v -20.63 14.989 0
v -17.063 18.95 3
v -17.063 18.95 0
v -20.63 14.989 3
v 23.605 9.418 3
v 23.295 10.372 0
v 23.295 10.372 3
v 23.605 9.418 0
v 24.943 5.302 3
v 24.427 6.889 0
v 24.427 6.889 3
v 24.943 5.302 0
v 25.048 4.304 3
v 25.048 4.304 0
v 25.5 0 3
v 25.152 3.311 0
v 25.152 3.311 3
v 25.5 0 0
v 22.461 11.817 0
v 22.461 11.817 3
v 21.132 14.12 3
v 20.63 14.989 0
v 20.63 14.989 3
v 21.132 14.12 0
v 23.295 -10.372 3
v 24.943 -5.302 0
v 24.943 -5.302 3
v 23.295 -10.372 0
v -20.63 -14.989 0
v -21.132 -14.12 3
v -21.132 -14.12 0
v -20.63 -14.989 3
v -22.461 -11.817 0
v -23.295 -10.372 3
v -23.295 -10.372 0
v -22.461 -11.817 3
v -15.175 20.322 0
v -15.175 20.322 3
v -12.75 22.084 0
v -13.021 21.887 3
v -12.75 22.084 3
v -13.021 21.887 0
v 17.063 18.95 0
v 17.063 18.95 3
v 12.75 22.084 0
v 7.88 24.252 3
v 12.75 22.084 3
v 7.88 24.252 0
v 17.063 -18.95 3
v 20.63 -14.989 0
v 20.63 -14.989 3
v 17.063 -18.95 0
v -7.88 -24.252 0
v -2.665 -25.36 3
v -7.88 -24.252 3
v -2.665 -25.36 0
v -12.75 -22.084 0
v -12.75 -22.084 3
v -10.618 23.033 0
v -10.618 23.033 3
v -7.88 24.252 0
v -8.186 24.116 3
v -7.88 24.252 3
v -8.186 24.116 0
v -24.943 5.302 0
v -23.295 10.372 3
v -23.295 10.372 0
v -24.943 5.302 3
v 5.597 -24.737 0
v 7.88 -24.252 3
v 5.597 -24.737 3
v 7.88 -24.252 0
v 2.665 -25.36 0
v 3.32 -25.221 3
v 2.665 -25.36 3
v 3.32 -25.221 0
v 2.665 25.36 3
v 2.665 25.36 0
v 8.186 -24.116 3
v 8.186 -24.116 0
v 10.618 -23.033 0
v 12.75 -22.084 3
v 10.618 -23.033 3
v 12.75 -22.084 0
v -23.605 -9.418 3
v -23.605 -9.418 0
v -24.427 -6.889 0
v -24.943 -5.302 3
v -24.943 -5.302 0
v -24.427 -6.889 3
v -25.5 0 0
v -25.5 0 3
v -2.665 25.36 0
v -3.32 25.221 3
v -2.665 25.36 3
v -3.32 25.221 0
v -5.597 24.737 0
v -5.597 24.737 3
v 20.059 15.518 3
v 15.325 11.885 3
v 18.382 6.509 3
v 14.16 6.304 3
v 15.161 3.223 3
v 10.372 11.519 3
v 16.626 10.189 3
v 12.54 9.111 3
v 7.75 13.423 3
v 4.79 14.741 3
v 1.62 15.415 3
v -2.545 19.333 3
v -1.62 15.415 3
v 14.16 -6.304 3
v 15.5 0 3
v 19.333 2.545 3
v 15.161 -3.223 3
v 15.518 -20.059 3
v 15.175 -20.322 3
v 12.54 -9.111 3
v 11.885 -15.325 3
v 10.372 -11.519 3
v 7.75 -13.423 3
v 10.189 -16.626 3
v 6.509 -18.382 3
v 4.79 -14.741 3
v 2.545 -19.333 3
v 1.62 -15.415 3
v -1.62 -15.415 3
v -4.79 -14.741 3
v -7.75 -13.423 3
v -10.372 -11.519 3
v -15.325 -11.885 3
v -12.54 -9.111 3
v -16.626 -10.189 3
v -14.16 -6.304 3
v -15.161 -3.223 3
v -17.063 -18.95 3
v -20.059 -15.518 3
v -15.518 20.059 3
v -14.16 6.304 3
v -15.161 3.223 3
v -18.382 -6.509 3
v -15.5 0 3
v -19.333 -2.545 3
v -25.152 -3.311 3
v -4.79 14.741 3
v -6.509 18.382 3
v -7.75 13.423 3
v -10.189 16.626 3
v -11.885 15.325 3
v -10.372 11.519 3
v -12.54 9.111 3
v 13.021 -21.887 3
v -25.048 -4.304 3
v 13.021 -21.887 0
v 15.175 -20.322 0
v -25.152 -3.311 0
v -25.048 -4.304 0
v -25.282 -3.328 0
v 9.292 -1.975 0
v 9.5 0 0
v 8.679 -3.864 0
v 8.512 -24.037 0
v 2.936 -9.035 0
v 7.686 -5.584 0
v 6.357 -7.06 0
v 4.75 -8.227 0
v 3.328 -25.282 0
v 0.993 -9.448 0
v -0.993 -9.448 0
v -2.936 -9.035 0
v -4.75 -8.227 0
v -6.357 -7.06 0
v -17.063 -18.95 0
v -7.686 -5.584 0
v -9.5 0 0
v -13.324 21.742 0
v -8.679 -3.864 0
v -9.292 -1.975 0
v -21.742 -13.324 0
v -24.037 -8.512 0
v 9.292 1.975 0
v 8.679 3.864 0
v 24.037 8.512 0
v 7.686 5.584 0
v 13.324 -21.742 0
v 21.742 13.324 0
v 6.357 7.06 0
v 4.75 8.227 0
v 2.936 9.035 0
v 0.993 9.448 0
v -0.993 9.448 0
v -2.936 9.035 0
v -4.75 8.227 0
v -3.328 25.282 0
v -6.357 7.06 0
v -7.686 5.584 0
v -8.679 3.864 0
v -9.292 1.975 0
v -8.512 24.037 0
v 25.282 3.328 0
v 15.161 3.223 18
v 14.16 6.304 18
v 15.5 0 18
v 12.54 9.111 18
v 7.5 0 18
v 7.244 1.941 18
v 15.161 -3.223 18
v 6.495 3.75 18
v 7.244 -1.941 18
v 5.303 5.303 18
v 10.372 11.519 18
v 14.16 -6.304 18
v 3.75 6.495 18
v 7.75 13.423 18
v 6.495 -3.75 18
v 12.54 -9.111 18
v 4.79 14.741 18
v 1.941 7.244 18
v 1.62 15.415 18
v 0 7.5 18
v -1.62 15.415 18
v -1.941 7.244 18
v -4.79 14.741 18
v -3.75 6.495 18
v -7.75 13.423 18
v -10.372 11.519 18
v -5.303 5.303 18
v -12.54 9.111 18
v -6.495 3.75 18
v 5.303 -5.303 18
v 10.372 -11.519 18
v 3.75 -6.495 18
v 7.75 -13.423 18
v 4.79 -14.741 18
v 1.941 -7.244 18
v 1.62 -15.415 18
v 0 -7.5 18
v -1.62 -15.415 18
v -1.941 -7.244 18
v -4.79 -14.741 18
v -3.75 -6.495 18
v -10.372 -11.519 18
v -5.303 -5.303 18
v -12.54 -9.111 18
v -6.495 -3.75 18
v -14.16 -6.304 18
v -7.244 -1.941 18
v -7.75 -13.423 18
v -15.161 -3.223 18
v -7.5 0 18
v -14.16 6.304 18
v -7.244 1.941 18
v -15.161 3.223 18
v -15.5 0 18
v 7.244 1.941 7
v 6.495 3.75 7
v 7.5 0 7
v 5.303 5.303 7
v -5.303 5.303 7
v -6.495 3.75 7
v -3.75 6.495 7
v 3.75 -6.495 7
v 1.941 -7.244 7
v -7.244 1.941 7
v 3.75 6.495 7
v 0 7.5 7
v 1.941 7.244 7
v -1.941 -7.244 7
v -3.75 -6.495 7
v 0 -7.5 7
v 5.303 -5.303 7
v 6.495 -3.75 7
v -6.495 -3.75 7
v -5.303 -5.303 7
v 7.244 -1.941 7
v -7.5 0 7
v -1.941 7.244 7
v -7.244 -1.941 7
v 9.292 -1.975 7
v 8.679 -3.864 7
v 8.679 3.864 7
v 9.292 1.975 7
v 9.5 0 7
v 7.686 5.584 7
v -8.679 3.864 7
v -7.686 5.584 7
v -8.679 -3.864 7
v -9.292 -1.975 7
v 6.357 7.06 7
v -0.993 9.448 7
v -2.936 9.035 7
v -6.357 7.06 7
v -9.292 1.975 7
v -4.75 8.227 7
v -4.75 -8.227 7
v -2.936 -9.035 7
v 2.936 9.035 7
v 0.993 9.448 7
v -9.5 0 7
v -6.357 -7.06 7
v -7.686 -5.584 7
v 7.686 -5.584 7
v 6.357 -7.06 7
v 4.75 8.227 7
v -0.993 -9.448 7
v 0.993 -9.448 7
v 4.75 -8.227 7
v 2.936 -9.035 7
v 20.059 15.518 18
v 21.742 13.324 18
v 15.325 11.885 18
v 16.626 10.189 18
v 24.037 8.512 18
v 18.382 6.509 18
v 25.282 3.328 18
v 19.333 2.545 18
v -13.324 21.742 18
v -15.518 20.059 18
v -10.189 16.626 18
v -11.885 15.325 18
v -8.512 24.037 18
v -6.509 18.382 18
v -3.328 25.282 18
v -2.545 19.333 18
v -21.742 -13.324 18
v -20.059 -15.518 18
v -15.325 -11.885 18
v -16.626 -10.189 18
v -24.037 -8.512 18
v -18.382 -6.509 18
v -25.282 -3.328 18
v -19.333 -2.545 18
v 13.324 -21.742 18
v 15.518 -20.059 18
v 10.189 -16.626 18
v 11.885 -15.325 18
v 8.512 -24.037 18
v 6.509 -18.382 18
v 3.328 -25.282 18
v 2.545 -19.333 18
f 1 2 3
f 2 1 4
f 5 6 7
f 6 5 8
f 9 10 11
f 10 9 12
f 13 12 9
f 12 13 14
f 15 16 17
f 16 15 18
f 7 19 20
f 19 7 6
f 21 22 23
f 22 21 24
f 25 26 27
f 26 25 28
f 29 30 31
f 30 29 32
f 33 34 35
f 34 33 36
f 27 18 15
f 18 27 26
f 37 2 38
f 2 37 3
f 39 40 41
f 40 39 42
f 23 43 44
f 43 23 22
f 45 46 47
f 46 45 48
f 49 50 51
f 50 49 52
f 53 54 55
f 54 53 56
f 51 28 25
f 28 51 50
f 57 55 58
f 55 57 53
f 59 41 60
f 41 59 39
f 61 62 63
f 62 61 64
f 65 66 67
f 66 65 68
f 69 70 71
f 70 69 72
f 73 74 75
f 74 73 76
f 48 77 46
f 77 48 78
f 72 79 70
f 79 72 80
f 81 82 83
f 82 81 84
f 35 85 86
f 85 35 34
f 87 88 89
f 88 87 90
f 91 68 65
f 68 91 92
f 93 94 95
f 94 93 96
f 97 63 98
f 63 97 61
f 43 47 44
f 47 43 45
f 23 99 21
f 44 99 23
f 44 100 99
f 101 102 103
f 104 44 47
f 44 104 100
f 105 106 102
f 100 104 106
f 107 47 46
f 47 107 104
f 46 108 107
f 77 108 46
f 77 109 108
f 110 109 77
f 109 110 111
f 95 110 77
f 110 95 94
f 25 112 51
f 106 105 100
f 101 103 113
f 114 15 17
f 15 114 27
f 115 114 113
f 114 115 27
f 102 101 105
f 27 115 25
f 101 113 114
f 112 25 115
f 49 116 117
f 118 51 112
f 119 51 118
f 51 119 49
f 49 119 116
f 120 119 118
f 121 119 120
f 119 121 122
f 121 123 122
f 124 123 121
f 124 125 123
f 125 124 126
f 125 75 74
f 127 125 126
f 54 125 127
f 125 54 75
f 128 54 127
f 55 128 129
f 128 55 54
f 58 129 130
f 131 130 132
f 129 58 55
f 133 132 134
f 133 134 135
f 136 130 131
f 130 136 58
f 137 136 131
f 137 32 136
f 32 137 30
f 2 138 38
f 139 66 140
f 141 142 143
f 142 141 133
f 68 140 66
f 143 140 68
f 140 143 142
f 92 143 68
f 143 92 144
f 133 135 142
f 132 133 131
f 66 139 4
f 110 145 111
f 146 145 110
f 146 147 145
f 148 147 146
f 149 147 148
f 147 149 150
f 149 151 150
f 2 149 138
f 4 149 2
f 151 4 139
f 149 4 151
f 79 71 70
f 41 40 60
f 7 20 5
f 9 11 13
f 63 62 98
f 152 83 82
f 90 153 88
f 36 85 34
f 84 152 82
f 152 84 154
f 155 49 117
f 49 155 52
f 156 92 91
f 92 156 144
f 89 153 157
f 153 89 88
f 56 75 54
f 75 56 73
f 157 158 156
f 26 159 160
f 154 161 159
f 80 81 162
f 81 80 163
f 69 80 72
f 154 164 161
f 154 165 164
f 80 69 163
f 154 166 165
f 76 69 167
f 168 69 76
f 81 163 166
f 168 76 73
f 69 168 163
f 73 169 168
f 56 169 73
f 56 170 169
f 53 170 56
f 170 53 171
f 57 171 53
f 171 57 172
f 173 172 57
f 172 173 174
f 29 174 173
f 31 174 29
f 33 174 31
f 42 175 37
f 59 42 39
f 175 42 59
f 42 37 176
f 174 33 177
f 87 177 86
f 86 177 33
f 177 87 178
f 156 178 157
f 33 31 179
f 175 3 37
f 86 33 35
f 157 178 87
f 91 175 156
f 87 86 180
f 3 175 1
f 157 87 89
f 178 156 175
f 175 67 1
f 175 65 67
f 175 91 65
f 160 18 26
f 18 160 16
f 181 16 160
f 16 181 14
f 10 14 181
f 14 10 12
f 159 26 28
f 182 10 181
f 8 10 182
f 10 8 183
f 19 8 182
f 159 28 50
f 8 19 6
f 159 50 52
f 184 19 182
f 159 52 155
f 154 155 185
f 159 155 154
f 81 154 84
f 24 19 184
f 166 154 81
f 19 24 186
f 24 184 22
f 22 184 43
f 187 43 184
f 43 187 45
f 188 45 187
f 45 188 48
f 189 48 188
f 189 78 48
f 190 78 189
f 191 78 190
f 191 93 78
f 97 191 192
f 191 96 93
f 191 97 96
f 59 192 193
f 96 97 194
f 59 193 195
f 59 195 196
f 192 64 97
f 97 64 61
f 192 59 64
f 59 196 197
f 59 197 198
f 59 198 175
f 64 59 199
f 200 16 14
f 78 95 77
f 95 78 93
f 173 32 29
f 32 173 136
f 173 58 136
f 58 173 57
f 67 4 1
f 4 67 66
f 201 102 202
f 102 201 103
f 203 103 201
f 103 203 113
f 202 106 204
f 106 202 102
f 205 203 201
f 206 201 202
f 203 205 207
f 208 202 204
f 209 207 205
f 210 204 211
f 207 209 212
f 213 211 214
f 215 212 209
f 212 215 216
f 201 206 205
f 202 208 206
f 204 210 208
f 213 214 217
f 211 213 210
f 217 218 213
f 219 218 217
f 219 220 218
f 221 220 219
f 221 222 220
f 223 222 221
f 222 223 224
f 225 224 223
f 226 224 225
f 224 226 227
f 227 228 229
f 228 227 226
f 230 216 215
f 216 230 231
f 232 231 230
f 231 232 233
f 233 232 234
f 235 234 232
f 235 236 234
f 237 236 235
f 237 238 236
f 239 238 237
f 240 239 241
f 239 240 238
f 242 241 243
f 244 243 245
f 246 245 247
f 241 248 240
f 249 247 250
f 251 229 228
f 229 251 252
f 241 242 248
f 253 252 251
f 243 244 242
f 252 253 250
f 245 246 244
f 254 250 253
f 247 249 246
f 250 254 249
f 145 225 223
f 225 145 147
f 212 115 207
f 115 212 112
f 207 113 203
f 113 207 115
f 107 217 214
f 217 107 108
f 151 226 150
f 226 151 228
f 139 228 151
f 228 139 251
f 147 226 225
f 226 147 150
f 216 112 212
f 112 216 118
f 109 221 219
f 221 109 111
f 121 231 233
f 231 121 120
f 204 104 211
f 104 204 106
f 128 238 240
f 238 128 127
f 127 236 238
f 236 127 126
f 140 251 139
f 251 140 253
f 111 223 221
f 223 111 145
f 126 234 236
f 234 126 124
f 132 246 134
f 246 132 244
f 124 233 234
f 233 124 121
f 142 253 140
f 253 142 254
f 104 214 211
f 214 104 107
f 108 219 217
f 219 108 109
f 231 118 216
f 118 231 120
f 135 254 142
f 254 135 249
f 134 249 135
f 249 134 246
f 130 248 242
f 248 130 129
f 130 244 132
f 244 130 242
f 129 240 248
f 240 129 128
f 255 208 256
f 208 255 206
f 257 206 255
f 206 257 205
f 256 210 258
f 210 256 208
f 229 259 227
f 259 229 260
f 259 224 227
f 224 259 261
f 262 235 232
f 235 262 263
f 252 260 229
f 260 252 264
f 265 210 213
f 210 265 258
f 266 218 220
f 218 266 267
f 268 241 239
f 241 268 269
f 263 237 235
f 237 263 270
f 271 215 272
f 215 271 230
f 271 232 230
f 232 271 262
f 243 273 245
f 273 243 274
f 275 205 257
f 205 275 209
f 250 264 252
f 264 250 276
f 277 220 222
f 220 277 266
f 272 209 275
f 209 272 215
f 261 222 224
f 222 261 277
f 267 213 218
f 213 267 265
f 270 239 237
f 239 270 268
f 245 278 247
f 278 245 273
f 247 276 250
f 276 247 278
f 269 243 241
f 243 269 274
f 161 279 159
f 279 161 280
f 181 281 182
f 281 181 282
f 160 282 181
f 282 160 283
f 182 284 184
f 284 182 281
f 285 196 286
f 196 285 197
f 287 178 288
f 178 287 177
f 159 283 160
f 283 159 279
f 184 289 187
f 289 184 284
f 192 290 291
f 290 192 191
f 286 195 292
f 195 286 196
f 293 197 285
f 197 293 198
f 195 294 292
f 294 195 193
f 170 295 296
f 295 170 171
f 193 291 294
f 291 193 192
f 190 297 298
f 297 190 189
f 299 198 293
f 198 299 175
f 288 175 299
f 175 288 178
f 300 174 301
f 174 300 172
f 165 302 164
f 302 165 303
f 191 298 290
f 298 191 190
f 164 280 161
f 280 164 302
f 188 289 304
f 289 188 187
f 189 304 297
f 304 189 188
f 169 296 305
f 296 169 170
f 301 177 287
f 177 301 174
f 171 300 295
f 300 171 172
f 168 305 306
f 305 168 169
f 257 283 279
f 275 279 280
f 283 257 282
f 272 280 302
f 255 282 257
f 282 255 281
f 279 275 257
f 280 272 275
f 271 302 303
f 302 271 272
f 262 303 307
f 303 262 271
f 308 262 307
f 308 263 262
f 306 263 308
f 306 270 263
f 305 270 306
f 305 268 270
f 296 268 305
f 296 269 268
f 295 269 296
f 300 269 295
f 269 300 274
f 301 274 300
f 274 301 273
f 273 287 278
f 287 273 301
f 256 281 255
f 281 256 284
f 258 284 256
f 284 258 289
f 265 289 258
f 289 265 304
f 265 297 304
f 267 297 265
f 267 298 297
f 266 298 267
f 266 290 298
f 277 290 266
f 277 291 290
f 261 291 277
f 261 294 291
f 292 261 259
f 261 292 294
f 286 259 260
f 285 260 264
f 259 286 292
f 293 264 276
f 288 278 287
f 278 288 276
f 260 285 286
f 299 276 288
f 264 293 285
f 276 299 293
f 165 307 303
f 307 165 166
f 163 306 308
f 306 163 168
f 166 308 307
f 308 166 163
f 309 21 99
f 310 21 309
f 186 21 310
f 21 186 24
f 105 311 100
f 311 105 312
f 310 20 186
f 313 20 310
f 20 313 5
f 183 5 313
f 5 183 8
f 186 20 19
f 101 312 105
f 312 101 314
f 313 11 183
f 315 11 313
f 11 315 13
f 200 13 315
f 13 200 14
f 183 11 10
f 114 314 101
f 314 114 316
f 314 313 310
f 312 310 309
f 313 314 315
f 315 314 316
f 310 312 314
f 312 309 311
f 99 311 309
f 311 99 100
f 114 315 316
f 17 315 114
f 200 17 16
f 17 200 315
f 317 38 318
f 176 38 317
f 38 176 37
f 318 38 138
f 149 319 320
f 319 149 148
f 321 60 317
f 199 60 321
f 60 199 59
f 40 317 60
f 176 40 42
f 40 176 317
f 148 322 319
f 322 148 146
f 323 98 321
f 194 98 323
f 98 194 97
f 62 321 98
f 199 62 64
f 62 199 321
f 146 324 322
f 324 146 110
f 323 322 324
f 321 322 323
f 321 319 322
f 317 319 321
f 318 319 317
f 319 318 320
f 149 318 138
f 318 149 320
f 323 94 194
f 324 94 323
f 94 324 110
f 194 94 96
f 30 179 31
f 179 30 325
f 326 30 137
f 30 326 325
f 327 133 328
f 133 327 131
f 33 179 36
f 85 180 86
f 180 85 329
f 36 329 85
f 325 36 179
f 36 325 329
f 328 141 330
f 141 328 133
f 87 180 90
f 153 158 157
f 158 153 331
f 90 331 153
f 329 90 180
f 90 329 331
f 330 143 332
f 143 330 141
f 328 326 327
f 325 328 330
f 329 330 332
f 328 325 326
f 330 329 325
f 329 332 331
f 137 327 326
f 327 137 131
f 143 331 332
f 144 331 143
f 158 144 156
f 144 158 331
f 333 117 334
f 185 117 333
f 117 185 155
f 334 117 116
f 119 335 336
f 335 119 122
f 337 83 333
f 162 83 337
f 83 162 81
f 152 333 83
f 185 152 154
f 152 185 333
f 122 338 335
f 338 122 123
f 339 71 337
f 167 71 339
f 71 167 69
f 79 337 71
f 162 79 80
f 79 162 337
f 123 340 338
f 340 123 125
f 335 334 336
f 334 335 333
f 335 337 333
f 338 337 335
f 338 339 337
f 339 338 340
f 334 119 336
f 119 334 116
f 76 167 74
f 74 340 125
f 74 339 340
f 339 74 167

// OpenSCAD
//Thanks to Jeremie Francois for his OpenSCAD tutorial @ http://www.tridimake.com/2014/09/how-to-use-openscad-tricks-and-tips-to.html

part_d=51; //outside diameter of entire part
prong_height=18;
spool_cylinder_height=18;
spool_cylinder_diameter=31;
bearing_diameter=19;
bearing_thickness=7;
bearing_lip_width=2;
bottom_thickness=3;
prong_thickness=6;
prong_arc_deg=30; //this has to be less than 45

difference()
{
	difference()
	{
		union()
		{
			cylinder(r=part_d/2,h=bottom_thickness);  //base
			cylinder(r=spool_cylinder_diameter/2,h=18);  //what fits inside the spool
		}
		translate([0,0,-.01]) //start a bit below
			cylinder(r=bearing_diameter/2 - bearing_lip_width,h=spool_cylinder_height +.01 +.01); //protrude from both faces
	}
	
	translate([0,0,-.01]) //start a bit below
		cylinder(r=bearing_diameter/2,h=bearing_thickness + .01, center=false); //set the bearing lip
}
	

for(r=[(45 - prong_arc_deg)/2:90:359]) //fit the prong arc evenly within each 45 deg segment of the circle
	rotate([0,0,r])
		intersection()
		{
			rotate_extrude(convexity=10)
				translate([part_d/2 - prong_thickness,0,0])
					square([prong_thickness,prong_height]);
			prong(angle=prong_arc_deg);
		}

 module prong(angle, extent=100, height=100, center=true)
{
	module prong_wall()
	{
		translate([0,0, (center==true ? -height/2: 0)])
			cube([extent, 0.1, height]);
	}
	
	hull()
	{
		prong_wall();
		rotate([0,0,angle])
			prong_wall();
	}
	
	
}
